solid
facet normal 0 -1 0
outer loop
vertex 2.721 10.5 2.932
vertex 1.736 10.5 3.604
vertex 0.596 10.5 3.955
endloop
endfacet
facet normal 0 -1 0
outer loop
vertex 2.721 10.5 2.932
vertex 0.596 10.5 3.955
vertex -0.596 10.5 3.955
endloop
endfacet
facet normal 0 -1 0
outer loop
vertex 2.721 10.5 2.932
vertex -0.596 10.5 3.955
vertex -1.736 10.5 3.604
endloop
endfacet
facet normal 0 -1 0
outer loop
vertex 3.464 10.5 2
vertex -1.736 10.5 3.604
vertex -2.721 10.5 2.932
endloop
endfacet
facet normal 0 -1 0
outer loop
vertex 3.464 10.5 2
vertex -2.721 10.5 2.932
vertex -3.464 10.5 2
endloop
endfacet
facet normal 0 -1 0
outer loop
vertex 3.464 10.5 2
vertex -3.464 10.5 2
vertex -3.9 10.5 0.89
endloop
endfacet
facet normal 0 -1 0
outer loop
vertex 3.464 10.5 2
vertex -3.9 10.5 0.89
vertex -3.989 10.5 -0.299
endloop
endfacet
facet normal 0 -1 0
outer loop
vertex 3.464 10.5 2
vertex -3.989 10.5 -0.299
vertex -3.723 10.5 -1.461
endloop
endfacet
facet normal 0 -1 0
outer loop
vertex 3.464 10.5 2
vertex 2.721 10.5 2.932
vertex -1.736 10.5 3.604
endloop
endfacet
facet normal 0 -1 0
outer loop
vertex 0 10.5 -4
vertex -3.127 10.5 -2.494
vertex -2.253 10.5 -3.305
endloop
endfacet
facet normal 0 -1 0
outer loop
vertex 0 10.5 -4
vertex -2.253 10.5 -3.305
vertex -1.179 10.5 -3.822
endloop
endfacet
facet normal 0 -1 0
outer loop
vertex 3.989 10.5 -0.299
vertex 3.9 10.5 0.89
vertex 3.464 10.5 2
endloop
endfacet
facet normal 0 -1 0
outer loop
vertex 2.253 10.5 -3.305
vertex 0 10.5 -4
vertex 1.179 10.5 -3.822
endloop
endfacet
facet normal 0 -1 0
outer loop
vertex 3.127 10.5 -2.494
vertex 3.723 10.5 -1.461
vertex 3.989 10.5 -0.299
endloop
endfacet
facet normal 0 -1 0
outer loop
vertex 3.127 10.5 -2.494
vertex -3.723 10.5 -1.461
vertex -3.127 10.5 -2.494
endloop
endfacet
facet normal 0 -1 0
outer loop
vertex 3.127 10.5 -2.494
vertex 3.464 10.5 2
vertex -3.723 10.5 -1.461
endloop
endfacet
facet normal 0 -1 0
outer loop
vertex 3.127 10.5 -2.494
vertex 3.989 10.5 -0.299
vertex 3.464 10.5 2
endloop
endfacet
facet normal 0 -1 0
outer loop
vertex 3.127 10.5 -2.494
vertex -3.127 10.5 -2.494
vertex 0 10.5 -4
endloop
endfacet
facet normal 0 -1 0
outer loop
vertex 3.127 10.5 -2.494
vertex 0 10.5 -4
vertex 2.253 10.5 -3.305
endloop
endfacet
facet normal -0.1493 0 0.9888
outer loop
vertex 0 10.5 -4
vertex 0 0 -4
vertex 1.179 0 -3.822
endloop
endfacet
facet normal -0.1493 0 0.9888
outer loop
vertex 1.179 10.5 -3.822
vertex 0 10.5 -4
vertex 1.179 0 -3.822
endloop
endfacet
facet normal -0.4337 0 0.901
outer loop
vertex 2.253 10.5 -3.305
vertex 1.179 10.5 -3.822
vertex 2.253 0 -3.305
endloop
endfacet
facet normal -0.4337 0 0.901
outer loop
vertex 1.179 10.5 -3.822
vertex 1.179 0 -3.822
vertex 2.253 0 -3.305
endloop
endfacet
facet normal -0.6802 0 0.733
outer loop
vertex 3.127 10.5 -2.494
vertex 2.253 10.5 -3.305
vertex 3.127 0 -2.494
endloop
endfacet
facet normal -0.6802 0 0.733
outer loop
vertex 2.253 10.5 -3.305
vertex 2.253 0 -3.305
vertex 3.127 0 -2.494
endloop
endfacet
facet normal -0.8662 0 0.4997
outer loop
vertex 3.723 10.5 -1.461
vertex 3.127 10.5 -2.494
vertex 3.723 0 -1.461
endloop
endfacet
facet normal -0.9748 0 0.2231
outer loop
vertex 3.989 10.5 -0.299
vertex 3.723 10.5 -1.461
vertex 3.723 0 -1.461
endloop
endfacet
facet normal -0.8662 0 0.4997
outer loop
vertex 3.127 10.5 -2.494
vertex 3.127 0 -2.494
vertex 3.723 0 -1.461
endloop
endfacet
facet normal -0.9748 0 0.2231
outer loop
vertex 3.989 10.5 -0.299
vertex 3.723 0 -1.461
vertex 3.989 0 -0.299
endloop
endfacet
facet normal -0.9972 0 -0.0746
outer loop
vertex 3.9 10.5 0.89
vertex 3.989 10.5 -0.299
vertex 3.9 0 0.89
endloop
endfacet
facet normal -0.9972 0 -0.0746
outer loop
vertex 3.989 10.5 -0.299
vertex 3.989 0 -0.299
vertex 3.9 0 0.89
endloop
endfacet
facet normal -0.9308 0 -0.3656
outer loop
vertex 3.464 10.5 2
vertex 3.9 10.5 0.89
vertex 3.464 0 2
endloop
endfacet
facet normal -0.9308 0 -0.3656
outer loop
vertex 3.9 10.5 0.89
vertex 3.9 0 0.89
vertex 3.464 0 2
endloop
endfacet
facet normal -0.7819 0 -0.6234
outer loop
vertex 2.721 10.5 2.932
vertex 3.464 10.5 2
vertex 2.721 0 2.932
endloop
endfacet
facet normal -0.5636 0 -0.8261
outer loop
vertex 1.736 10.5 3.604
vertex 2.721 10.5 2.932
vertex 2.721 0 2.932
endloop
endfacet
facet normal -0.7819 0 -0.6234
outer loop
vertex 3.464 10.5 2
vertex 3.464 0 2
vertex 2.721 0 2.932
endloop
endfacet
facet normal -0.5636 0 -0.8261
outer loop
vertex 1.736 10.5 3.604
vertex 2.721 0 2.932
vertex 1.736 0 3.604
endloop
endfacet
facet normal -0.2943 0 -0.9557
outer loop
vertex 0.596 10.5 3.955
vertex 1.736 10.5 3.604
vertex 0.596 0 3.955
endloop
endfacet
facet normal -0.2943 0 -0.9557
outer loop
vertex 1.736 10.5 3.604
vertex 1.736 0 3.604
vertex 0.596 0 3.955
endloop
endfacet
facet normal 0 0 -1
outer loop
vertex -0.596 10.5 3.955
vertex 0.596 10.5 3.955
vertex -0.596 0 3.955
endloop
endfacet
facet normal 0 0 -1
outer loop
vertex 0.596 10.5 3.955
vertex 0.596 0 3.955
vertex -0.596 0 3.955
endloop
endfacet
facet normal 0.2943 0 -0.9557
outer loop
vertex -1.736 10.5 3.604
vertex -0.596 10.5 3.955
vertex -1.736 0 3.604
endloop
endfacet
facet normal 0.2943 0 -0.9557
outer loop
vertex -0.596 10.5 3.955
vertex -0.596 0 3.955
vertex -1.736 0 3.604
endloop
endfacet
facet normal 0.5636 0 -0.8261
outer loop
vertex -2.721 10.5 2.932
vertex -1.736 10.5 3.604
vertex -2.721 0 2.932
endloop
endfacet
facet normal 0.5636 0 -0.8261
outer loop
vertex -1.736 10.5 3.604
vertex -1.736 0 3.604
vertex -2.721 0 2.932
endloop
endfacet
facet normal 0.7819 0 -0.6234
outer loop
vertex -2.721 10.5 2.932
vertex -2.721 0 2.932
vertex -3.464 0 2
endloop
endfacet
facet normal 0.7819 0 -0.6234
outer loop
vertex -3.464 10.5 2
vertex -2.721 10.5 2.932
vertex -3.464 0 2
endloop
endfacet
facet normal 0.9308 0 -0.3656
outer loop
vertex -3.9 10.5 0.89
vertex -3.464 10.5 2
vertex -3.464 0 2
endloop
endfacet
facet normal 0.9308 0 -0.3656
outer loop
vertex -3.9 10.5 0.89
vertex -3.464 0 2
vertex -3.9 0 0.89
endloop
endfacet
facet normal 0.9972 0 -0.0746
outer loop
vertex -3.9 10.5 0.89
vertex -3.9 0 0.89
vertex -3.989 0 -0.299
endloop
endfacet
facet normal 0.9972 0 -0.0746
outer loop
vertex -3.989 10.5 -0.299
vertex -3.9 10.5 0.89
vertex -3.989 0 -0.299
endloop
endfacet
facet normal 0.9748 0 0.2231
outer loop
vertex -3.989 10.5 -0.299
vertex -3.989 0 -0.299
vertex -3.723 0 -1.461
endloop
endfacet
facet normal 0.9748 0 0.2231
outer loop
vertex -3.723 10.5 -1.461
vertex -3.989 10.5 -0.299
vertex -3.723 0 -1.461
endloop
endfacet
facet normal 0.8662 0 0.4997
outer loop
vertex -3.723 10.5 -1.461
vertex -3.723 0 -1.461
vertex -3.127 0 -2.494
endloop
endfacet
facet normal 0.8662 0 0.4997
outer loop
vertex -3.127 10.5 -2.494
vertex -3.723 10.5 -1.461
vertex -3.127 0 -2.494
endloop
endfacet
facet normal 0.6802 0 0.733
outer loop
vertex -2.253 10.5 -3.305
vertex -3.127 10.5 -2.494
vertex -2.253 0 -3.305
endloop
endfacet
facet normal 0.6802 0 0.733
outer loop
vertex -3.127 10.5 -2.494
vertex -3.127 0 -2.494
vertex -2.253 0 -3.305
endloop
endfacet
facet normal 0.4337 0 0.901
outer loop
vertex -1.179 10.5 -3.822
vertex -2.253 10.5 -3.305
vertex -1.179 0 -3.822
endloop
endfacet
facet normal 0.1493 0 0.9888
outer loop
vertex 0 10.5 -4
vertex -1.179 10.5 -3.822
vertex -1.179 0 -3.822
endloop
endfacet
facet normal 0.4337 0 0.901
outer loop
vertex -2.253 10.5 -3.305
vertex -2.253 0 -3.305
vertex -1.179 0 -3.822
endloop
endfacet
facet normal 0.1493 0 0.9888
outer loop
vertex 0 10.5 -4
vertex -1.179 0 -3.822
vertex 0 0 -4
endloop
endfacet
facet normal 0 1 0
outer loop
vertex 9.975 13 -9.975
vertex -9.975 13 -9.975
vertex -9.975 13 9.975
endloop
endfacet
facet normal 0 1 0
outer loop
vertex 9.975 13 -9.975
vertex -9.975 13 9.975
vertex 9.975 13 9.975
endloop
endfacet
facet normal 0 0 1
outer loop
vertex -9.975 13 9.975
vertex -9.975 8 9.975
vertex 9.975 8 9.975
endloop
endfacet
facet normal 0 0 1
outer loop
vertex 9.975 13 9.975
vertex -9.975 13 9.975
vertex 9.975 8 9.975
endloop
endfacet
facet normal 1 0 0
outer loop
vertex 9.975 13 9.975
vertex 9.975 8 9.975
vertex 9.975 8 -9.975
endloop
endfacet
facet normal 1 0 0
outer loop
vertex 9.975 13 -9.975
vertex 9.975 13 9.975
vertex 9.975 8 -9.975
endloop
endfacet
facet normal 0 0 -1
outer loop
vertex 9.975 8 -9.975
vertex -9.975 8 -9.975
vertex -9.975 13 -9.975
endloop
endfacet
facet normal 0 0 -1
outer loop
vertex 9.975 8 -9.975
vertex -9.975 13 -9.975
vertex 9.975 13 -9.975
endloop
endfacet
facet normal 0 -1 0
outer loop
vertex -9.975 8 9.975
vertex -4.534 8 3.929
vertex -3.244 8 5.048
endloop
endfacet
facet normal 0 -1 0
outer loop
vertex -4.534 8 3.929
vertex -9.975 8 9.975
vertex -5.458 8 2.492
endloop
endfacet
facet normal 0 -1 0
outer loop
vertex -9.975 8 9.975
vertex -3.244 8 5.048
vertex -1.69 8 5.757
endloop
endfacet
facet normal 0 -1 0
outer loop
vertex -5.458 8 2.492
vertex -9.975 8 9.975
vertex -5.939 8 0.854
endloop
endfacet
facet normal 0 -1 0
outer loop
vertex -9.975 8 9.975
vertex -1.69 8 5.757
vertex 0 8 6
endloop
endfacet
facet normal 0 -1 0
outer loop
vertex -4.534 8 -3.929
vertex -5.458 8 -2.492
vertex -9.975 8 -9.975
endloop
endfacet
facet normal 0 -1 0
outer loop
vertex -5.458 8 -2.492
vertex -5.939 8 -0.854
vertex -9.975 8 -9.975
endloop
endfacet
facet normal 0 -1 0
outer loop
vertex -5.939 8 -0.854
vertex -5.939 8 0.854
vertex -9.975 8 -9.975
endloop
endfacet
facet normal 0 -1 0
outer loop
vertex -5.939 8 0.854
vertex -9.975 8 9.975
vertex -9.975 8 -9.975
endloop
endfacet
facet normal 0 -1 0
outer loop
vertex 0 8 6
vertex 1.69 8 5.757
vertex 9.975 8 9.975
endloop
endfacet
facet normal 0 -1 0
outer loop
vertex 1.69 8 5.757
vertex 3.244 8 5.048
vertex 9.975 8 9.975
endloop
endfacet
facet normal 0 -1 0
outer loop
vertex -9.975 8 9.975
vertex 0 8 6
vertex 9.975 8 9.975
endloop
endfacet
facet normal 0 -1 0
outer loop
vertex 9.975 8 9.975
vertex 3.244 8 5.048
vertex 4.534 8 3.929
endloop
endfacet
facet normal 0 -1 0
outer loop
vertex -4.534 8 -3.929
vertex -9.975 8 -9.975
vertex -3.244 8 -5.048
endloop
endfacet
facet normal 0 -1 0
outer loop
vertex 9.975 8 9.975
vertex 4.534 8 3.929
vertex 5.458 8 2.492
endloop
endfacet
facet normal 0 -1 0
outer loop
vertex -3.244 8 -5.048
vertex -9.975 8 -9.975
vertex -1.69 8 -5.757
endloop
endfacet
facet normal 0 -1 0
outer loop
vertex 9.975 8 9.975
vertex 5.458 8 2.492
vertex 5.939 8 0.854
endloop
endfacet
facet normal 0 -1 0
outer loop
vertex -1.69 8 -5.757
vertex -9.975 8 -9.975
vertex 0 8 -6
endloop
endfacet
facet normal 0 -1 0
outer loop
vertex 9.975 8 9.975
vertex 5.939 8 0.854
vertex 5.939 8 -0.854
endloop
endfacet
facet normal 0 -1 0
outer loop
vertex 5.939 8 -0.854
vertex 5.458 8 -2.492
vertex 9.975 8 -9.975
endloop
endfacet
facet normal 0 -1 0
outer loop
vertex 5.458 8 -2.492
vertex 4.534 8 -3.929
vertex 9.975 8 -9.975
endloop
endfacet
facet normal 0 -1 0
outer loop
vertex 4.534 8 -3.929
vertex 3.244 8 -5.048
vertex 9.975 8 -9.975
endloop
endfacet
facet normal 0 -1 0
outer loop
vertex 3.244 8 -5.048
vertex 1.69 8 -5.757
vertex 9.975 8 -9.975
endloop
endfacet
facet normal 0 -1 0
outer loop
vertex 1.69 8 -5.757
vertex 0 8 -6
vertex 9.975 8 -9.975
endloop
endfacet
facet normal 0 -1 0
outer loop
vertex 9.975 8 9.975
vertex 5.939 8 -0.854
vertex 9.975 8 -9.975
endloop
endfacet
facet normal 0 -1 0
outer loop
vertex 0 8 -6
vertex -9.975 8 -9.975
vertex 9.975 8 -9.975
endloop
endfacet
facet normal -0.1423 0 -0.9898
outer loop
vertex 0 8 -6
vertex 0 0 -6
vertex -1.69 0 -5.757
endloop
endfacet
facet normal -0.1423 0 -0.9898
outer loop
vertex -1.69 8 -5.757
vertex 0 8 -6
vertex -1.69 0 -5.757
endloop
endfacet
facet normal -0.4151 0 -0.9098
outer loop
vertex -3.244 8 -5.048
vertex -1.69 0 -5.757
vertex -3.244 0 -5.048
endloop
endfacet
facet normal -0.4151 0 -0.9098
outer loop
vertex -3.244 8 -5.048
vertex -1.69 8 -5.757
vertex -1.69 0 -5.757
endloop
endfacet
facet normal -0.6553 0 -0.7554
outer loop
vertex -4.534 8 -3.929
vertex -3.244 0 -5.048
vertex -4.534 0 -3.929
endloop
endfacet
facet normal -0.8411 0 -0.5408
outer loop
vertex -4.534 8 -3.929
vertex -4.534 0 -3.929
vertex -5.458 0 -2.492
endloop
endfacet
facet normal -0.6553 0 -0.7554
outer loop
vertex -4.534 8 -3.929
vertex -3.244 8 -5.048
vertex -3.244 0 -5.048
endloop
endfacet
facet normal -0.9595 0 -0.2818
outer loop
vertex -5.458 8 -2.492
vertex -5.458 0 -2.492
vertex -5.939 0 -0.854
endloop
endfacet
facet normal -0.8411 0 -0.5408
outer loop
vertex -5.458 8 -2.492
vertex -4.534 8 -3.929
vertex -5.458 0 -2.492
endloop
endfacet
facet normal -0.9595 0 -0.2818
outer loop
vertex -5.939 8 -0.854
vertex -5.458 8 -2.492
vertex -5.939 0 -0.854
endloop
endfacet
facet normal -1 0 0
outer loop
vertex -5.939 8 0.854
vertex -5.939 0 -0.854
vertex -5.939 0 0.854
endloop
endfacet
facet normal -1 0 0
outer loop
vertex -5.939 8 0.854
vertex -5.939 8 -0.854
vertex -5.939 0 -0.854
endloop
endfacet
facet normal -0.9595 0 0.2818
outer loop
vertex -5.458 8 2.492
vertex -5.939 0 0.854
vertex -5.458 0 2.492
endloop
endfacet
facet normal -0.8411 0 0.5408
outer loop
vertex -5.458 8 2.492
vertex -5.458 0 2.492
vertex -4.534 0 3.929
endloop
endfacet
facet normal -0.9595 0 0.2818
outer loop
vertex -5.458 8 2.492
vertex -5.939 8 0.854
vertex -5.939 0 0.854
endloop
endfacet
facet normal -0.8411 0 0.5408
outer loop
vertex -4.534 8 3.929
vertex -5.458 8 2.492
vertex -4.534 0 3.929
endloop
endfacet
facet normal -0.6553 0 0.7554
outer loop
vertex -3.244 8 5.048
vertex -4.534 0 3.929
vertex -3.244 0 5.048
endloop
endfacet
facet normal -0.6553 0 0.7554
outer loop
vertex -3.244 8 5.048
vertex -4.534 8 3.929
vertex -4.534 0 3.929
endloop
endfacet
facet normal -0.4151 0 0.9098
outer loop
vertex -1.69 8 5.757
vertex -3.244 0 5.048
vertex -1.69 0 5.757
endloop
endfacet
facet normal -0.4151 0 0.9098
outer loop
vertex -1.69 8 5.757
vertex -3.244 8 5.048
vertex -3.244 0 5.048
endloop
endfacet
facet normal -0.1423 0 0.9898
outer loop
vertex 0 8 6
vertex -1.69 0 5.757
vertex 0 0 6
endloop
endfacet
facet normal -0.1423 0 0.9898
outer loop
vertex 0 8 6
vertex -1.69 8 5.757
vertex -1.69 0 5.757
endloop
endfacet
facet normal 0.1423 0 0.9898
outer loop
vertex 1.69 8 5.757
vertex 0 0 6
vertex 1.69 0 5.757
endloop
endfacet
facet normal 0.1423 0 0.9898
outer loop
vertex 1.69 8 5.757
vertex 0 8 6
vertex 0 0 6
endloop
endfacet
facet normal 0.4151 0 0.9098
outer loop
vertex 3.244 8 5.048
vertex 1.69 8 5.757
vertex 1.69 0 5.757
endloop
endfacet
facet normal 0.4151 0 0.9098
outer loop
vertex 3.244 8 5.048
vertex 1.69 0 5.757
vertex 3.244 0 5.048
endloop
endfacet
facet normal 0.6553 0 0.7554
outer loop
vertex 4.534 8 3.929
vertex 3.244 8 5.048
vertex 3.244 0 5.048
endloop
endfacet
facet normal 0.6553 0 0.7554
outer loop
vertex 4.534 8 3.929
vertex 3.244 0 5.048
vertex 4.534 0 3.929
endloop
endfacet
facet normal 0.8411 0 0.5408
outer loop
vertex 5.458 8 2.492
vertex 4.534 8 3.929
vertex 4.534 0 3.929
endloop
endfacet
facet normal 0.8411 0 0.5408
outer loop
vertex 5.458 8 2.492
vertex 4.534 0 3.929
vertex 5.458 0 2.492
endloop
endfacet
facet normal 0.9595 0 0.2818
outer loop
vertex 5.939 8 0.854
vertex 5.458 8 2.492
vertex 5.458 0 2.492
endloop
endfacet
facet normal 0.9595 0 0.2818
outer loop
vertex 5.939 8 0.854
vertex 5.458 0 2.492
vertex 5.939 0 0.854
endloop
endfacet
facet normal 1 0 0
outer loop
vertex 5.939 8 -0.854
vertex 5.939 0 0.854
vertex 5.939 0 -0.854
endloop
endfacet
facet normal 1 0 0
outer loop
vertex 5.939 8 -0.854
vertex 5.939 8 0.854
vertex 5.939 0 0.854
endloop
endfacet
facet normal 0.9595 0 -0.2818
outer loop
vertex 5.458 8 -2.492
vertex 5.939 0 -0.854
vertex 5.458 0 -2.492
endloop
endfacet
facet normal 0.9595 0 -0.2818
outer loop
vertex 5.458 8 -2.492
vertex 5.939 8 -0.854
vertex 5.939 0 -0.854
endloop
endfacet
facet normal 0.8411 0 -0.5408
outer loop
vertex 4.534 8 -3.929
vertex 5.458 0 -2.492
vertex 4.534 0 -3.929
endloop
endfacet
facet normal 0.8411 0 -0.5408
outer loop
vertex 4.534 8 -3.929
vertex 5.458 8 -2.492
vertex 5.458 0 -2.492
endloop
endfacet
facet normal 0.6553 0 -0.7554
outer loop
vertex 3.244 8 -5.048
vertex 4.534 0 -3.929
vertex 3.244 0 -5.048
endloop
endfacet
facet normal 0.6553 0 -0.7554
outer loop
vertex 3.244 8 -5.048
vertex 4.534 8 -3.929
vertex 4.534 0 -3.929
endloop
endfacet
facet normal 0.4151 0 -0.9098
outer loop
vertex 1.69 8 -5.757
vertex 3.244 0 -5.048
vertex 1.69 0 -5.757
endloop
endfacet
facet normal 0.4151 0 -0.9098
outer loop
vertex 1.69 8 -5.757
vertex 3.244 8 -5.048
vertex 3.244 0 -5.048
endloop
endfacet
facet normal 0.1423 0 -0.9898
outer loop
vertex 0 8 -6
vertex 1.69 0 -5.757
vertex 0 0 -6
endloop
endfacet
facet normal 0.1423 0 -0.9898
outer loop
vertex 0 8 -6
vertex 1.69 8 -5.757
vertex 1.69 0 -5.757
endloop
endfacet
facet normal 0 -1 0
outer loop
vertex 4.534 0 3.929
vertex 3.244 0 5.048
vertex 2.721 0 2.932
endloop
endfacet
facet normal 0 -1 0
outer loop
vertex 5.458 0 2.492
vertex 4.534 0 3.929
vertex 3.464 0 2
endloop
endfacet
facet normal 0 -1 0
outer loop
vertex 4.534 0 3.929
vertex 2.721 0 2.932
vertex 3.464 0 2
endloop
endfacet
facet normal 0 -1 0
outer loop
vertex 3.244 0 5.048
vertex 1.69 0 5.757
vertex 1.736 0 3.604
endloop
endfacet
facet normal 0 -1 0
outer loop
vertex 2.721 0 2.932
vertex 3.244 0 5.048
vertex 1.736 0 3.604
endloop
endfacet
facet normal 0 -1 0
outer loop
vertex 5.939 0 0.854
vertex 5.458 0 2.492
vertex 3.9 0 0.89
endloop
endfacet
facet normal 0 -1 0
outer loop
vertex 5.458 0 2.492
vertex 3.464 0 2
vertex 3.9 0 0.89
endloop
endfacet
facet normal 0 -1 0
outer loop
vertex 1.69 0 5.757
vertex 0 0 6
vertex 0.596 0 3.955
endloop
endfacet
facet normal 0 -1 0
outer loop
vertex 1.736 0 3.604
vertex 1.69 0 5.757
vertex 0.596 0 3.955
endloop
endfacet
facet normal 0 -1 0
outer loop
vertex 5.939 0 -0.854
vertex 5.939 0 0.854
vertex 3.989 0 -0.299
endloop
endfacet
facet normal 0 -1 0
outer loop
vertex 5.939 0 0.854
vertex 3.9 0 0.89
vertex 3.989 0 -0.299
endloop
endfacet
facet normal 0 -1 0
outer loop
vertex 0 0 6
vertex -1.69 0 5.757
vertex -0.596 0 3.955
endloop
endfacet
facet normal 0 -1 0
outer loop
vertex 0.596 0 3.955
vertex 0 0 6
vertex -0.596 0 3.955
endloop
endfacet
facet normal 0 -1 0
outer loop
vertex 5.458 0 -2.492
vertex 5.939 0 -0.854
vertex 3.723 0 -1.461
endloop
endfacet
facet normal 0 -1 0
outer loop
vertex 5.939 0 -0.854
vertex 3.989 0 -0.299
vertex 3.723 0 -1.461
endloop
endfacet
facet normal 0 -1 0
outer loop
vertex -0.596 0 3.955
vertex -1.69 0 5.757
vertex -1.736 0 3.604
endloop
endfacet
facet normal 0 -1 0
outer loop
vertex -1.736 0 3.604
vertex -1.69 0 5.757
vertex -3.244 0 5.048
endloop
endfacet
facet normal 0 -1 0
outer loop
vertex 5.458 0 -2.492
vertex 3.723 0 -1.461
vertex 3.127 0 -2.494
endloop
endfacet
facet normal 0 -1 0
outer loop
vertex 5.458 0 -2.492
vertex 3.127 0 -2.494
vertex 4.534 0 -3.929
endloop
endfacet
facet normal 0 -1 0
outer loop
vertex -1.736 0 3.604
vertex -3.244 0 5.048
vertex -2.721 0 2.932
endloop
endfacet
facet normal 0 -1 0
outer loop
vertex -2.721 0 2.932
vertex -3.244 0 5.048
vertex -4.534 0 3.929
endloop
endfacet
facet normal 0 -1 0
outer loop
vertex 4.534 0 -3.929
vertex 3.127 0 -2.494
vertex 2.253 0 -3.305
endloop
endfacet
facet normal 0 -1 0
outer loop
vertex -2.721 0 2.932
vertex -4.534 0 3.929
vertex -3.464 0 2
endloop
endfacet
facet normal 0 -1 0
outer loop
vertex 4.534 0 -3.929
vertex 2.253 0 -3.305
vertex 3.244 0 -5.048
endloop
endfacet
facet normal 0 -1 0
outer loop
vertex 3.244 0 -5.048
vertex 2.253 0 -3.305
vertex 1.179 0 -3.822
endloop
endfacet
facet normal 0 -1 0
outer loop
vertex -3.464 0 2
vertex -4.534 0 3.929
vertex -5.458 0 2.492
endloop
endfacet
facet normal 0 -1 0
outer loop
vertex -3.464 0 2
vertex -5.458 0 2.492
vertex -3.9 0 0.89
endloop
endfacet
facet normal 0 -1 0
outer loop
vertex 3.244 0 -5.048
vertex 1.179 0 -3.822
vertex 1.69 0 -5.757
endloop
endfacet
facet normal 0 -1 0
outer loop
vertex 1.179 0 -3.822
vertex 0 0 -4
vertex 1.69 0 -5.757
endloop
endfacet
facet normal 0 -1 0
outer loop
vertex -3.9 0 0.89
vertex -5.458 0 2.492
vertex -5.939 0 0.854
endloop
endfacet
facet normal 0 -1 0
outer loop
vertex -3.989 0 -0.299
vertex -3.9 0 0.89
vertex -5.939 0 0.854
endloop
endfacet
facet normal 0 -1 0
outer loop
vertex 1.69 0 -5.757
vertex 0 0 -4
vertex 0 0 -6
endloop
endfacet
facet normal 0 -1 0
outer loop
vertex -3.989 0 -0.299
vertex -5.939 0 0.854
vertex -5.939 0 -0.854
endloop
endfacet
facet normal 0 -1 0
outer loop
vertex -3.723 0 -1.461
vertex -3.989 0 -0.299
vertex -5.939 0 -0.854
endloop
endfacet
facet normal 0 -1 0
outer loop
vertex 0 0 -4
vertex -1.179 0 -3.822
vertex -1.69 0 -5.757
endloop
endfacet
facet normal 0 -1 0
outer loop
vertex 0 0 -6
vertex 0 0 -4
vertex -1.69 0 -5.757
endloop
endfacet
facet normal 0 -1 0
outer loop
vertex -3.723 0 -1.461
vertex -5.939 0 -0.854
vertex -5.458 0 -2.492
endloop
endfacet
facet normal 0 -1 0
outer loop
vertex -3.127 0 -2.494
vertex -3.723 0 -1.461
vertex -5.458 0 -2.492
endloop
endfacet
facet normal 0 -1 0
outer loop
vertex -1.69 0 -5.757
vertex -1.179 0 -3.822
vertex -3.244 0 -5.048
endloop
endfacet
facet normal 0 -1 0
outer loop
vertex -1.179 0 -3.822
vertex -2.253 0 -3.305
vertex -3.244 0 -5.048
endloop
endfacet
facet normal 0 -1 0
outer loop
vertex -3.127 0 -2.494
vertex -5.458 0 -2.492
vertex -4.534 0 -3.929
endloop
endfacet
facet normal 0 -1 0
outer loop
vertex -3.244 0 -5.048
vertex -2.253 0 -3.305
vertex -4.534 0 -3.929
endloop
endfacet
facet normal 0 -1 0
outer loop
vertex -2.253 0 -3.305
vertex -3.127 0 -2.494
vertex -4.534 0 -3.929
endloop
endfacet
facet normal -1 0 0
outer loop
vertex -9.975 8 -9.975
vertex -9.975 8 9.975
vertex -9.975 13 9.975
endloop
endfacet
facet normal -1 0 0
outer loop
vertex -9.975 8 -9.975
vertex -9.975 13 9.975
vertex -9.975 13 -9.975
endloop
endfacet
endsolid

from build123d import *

# Parameters (mm, degrees)
CROQUIS1_W              = 6
CROQUIS1_H              = 8
CROQUIS2_W              = 19.95
CROQUIS2_H              = 19.95
SALIENTE_EXTRUIR1_DEPTH = 5
SKETCH6_R               = 4
CUT_EXTRUDE1_DEPTH      = 10.5


with BuildPart() as part:
    # Croquis1 → Revolución1 (revolve)
    with BuildSketch(Plane(origin=(0, 0, 0), x_dir=(0, 0, -1), z_dir=(1, 0, 0)), mode=Mode.PRIVATE) as revoluci_n1_sk:
        with Locations((-3, 4)):
            Rectangle(CROQUIS1_W, CROQUIS1_H)
    revolve(revoluci_n1_sk.sketch.rotate(Axis((0, 0, 0), (0, 1, 0)), 180), axis=Axis((0, 0, 0), (0, 1, 0)))

    # Croquis2 → Saliente-Extruir1 (add)
    with BuildSketch(Plane(origin=(0, 8, 0), x_dir=(1, 0, 0), z_dir=(0, 1, 0))):
        Rectangle(CROQUIS2_W, CROQUIS2_H)
    extrude(amount=SALIENTE_EXTRUIR1_DEPTH)

    # Sketch6 → Cut-Extrude1 (cut)
    with BuildSketch(Plane.XZ):
        with Locations(Location((0, 0, 0), (0, 0, 270))):
            Circle(SKETCH6_R)
    extrude(amount=-CUT_EXTRUDE1_DEPTH, mode=Mode.SUBTRACT)


solid = part.part
